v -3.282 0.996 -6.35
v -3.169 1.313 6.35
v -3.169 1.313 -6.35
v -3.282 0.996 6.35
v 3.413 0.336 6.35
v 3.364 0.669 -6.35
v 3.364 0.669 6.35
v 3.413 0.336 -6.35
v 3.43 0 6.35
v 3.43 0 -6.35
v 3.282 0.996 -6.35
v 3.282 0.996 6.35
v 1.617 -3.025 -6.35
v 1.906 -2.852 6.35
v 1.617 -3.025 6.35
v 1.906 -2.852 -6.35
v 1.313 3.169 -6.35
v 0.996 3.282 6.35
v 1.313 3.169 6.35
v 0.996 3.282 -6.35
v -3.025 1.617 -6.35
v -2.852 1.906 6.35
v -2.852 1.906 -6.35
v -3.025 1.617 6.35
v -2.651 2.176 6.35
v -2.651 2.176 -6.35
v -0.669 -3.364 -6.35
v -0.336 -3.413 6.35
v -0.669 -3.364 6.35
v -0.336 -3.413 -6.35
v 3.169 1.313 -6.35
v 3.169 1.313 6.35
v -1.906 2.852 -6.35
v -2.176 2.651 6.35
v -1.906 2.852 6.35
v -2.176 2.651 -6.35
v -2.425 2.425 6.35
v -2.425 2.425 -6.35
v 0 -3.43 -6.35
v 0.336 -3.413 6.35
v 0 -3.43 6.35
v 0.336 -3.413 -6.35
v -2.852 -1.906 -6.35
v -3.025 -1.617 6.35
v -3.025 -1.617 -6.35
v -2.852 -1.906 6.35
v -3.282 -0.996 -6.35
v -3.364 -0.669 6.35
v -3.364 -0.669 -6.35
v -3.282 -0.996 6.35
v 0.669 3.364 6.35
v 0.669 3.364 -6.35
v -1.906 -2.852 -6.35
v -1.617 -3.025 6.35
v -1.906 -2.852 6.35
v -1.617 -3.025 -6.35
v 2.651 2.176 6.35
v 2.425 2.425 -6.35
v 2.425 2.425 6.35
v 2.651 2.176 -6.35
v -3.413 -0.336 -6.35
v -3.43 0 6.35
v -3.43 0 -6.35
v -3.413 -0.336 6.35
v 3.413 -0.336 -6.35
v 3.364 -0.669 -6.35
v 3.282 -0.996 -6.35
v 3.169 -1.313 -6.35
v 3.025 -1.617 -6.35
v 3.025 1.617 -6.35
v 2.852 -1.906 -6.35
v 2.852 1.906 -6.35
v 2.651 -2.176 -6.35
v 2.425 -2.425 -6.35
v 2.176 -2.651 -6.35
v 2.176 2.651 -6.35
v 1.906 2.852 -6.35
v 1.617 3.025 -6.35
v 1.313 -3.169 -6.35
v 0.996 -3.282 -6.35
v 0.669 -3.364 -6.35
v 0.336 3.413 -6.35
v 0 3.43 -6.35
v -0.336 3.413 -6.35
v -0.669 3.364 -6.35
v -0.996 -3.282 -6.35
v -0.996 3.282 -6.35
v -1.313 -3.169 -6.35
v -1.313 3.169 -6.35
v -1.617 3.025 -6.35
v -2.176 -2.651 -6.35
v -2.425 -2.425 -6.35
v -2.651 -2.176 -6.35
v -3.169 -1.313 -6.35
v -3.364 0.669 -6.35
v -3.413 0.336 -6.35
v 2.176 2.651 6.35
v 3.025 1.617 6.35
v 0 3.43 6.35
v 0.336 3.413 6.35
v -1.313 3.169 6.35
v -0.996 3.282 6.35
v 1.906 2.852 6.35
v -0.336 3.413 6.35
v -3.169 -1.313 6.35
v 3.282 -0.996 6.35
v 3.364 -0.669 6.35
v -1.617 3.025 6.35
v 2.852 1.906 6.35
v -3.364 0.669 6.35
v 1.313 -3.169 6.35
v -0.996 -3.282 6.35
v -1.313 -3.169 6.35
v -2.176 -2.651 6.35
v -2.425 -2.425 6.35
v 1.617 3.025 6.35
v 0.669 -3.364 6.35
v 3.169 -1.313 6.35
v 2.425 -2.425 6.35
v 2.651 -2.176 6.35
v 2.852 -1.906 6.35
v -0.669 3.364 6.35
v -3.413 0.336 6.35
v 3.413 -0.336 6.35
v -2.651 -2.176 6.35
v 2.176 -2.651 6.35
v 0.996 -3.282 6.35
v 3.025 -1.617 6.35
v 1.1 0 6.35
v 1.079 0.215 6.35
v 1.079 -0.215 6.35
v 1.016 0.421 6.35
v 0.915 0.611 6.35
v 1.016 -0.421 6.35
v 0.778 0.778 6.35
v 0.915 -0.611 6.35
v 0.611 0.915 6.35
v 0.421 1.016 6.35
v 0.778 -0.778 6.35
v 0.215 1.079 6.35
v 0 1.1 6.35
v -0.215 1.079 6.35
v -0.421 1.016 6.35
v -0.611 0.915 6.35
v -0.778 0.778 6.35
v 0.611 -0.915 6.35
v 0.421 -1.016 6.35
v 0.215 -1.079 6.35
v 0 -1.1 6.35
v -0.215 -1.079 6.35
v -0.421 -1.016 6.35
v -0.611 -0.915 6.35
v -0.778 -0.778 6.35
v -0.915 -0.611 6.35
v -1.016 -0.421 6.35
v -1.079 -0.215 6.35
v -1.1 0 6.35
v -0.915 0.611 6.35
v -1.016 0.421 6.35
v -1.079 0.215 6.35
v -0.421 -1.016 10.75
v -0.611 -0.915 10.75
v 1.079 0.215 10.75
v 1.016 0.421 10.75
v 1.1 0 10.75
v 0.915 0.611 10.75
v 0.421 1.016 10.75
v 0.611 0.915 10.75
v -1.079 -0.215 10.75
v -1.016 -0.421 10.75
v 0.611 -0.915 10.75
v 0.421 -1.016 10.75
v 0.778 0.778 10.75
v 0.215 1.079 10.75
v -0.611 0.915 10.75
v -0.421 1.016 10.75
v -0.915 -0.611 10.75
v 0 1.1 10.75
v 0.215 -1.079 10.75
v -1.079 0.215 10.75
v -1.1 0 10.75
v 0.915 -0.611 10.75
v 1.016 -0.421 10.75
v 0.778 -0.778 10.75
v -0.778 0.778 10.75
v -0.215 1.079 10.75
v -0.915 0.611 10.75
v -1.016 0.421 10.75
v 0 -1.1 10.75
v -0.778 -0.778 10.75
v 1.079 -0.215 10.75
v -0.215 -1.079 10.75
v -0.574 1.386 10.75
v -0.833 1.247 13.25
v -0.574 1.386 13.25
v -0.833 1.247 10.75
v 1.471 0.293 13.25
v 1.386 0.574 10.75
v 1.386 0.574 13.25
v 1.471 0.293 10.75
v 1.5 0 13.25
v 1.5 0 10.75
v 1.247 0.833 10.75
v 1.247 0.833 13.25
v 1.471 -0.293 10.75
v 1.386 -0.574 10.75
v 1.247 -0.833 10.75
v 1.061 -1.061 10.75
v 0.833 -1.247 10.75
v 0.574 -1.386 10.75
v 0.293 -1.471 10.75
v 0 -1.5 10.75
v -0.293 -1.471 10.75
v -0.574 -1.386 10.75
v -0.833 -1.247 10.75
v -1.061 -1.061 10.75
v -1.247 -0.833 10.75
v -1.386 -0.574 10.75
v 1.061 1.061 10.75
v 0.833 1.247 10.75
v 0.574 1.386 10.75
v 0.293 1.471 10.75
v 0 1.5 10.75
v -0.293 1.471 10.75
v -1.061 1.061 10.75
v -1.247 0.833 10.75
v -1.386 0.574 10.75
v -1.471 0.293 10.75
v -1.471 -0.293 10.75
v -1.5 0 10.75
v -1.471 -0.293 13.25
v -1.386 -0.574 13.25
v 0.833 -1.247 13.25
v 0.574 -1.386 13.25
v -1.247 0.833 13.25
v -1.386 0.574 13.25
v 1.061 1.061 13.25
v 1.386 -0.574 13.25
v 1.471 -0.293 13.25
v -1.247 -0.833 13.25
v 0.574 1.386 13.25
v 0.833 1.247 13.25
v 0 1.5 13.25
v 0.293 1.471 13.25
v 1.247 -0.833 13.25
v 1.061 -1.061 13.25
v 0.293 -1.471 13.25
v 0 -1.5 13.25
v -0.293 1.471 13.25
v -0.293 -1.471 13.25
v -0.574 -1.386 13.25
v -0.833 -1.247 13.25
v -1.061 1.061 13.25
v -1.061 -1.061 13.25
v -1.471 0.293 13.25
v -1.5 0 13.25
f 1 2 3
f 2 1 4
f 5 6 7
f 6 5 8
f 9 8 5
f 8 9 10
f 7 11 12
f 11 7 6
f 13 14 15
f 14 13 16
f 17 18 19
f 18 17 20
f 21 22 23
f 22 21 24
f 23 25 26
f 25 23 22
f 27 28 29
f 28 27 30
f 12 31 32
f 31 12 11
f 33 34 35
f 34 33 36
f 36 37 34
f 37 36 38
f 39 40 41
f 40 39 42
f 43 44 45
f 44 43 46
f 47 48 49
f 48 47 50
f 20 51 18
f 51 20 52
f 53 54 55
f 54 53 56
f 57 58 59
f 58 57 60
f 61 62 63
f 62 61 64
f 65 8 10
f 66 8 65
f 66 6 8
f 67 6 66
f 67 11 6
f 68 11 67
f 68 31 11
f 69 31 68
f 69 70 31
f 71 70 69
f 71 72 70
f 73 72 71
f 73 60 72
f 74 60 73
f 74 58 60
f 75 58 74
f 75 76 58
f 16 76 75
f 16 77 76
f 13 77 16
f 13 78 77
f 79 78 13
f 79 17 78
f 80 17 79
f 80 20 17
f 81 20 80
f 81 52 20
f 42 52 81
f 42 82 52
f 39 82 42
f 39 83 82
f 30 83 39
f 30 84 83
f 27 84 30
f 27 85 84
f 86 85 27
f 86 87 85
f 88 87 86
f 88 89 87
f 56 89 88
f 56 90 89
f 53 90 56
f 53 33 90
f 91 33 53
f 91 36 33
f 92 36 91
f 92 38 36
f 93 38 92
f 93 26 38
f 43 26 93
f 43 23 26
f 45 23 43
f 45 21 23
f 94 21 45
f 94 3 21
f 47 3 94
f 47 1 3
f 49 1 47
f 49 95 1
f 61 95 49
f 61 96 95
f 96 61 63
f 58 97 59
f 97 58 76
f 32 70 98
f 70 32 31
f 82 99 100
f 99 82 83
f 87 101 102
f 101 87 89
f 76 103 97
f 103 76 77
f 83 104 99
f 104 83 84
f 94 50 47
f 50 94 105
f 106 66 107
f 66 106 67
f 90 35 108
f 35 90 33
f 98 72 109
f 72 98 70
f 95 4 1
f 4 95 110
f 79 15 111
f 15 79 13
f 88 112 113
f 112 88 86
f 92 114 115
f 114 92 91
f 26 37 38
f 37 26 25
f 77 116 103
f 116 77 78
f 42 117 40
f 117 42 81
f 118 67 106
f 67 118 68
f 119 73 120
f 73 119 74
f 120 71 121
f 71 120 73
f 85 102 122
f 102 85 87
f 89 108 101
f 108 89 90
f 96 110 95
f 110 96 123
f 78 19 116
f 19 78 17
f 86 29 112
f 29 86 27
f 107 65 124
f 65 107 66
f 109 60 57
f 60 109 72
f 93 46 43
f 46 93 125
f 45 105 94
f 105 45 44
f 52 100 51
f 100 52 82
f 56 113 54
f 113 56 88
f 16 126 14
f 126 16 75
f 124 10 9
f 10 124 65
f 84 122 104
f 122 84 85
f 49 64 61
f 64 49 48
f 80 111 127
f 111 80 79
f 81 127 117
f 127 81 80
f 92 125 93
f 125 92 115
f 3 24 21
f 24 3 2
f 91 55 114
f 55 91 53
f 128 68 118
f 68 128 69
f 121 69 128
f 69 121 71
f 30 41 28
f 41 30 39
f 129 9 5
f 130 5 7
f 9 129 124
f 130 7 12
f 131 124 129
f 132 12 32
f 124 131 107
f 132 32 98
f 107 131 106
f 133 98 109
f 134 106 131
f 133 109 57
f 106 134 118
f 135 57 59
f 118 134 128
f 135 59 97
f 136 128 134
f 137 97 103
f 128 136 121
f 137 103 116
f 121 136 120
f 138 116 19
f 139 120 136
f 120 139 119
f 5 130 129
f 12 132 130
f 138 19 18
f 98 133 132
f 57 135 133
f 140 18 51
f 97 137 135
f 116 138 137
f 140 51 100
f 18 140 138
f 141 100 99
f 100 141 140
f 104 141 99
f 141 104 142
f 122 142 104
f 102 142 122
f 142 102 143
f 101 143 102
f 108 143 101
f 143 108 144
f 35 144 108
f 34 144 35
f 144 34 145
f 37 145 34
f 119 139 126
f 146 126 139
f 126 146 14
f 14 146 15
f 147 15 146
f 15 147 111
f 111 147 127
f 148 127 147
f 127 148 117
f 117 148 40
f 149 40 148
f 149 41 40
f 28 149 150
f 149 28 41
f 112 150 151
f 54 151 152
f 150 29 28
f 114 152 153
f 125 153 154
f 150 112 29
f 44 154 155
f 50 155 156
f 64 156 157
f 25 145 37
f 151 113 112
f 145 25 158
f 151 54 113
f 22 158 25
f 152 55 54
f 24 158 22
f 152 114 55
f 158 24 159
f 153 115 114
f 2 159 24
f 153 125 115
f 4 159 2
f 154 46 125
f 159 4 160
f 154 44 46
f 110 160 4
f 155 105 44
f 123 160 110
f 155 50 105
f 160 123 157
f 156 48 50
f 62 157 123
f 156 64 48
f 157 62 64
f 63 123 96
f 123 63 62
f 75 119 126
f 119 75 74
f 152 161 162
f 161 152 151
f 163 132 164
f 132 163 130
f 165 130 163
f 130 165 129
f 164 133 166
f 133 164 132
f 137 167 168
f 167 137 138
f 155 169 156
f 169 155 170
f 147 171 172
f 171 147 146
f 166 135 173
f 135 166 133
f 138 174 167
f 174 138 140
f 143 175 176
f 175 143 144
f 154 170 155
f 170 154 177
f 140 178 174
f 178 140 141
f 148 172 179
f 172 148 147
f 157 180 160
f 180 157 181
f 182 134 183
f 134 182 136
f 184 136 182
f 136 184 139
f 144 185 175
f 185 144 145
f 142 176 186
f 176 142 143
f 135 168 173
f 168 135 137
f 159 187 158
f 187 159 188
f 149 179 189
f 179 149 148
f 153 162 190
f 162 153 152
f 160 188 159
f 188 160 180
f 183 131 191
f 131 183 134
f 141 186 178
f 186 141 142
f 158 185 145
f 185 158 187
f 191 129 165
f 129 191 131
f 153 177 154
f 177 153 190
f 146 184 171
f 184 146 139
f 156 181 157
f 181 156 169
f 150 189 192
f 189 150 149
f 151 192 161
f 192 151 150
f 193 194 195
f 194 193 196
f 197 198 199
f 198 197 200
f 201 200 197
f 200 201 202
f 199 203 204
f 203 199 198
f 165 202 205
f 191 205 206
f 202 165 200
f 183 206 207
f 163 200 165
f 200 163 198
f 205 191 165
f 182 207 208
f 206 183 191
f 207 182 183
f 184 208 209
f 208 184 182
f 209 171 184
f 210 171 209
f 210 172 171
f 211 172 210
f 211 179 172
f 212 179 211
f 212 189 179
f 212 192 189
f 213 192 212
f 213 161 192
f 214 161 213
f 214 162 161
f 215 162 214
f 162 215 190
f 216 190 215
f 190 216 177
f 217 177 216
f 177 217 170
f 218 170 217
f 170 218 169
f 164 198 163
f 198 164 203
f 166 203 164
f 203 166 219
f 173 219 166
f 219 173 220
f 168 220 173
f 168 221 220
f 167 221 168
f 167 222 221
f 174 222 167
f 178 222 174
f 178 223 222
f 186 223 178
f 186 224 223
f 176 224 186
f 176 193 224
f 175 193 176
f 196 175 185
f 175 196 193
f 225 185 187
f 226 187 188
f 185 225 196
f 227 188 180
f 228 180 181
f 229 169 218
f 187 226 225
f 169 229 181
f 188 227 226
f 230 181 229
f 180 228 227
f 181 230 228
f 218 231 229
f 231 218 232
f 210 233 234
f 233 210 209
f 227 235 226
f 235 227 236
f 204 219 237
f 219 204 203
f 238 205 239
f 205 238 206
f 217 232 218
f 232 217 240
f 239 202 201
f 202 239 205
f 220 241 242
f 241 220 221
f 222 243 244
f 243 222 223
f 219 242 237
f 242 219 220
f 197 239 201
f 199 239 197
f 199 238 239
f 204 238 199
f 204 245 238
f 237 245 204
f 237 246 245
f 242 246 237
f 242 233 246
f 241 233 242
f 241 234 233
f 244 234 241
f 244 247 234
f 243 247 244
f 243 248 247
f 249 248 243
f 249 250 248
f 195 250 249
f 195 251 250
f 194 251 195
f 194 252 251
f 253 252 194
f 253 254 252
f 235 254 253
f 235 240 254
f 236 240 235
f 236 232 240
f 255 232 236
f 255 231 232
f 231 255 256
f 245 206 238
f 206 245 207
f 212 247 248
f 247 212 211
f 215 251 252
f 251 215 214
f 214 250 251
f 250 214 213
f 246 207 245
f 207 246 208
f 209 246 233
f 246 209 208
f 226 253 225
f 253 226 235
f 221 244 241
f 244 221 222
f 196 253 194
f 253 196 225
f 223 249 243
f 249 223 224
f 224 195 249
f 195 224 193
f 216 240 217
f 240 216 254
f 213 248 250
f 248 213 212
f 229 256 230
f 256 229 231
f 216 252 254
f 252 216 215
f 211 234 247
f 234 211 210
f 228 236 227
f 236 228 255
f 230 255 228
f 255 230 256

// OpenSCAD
// Parameters
body_diameter_mm = 6.86; //[3.43:13.72:0.01]
body_height_mm = 12.7; //[6.35:25.4:0.01]
centered = 1; //[0:1:1]
face_thickness_mm = 0.6; //[0.3:1.2:0.05]
overlap_mm = 0.8; //[0.5:2:0.1]
toggle_shaft_diameter_mm = 2.2; //[1.1:4.4:0.05]
toggle_shaft_height_mm = 6; //[3:12:0.1]
toggle_tip_diameter_mm = 3; //[1.5:6:0.1]
toggle_tip_height_mm = 2.5; //[1.25:5:0.1]

// Toggle switch geometry
module toggle() {
  union() {
    // Toggle Shaft
    color("Silver") translate([0, 0, body_height_mm/2 + toggle_shaft_height_mm/2 - overlap_mm])
      cylinder(r=toggle_shaft_diameter_mm/2, h=toggle_shaft_height_mm, center=true, $fn=32);
    
    // Toggle Tip
    color("Silver") translate([0, 0, body_height_mm/2 + toggle_shaft_height_mm - overlap_mm + toggle_tip_height_mm/2 - overlap_mm])
      cylinder(r=toggle_tip_diameter_mm/2, h=toggle_tip_height_mm, center=true, $fn=32);
  }
}

// Main switch body
module switch_body() {
  union() {
    // Cylindrical Body
    color("DimGray") translate([0, 0, 0])
      cylinder(r=body_diameter_mm/2, h=body_height_mm, center=true, $fn=64);
    
    // Top Face
    color("DimGray") translate([0, 0, body_height_mm/2 - face_thickness_mm/2])
      cylinder(r=body_diameter_mm/2, h=face_thickness_mm, center=true, $fn=64);
    
    // Bottom Face
    color("DimGray") translate([0, 0, -body_height_mm/2 + face_thickness_mm/2])
      cylinder(r=body_diameter_mm/2, h=face_thickness_mm, center=true, $fn=64);
  }
}

// Assembly
module assembly() {
  switch_body();
  toggle();
}

// Final output
assembly();
